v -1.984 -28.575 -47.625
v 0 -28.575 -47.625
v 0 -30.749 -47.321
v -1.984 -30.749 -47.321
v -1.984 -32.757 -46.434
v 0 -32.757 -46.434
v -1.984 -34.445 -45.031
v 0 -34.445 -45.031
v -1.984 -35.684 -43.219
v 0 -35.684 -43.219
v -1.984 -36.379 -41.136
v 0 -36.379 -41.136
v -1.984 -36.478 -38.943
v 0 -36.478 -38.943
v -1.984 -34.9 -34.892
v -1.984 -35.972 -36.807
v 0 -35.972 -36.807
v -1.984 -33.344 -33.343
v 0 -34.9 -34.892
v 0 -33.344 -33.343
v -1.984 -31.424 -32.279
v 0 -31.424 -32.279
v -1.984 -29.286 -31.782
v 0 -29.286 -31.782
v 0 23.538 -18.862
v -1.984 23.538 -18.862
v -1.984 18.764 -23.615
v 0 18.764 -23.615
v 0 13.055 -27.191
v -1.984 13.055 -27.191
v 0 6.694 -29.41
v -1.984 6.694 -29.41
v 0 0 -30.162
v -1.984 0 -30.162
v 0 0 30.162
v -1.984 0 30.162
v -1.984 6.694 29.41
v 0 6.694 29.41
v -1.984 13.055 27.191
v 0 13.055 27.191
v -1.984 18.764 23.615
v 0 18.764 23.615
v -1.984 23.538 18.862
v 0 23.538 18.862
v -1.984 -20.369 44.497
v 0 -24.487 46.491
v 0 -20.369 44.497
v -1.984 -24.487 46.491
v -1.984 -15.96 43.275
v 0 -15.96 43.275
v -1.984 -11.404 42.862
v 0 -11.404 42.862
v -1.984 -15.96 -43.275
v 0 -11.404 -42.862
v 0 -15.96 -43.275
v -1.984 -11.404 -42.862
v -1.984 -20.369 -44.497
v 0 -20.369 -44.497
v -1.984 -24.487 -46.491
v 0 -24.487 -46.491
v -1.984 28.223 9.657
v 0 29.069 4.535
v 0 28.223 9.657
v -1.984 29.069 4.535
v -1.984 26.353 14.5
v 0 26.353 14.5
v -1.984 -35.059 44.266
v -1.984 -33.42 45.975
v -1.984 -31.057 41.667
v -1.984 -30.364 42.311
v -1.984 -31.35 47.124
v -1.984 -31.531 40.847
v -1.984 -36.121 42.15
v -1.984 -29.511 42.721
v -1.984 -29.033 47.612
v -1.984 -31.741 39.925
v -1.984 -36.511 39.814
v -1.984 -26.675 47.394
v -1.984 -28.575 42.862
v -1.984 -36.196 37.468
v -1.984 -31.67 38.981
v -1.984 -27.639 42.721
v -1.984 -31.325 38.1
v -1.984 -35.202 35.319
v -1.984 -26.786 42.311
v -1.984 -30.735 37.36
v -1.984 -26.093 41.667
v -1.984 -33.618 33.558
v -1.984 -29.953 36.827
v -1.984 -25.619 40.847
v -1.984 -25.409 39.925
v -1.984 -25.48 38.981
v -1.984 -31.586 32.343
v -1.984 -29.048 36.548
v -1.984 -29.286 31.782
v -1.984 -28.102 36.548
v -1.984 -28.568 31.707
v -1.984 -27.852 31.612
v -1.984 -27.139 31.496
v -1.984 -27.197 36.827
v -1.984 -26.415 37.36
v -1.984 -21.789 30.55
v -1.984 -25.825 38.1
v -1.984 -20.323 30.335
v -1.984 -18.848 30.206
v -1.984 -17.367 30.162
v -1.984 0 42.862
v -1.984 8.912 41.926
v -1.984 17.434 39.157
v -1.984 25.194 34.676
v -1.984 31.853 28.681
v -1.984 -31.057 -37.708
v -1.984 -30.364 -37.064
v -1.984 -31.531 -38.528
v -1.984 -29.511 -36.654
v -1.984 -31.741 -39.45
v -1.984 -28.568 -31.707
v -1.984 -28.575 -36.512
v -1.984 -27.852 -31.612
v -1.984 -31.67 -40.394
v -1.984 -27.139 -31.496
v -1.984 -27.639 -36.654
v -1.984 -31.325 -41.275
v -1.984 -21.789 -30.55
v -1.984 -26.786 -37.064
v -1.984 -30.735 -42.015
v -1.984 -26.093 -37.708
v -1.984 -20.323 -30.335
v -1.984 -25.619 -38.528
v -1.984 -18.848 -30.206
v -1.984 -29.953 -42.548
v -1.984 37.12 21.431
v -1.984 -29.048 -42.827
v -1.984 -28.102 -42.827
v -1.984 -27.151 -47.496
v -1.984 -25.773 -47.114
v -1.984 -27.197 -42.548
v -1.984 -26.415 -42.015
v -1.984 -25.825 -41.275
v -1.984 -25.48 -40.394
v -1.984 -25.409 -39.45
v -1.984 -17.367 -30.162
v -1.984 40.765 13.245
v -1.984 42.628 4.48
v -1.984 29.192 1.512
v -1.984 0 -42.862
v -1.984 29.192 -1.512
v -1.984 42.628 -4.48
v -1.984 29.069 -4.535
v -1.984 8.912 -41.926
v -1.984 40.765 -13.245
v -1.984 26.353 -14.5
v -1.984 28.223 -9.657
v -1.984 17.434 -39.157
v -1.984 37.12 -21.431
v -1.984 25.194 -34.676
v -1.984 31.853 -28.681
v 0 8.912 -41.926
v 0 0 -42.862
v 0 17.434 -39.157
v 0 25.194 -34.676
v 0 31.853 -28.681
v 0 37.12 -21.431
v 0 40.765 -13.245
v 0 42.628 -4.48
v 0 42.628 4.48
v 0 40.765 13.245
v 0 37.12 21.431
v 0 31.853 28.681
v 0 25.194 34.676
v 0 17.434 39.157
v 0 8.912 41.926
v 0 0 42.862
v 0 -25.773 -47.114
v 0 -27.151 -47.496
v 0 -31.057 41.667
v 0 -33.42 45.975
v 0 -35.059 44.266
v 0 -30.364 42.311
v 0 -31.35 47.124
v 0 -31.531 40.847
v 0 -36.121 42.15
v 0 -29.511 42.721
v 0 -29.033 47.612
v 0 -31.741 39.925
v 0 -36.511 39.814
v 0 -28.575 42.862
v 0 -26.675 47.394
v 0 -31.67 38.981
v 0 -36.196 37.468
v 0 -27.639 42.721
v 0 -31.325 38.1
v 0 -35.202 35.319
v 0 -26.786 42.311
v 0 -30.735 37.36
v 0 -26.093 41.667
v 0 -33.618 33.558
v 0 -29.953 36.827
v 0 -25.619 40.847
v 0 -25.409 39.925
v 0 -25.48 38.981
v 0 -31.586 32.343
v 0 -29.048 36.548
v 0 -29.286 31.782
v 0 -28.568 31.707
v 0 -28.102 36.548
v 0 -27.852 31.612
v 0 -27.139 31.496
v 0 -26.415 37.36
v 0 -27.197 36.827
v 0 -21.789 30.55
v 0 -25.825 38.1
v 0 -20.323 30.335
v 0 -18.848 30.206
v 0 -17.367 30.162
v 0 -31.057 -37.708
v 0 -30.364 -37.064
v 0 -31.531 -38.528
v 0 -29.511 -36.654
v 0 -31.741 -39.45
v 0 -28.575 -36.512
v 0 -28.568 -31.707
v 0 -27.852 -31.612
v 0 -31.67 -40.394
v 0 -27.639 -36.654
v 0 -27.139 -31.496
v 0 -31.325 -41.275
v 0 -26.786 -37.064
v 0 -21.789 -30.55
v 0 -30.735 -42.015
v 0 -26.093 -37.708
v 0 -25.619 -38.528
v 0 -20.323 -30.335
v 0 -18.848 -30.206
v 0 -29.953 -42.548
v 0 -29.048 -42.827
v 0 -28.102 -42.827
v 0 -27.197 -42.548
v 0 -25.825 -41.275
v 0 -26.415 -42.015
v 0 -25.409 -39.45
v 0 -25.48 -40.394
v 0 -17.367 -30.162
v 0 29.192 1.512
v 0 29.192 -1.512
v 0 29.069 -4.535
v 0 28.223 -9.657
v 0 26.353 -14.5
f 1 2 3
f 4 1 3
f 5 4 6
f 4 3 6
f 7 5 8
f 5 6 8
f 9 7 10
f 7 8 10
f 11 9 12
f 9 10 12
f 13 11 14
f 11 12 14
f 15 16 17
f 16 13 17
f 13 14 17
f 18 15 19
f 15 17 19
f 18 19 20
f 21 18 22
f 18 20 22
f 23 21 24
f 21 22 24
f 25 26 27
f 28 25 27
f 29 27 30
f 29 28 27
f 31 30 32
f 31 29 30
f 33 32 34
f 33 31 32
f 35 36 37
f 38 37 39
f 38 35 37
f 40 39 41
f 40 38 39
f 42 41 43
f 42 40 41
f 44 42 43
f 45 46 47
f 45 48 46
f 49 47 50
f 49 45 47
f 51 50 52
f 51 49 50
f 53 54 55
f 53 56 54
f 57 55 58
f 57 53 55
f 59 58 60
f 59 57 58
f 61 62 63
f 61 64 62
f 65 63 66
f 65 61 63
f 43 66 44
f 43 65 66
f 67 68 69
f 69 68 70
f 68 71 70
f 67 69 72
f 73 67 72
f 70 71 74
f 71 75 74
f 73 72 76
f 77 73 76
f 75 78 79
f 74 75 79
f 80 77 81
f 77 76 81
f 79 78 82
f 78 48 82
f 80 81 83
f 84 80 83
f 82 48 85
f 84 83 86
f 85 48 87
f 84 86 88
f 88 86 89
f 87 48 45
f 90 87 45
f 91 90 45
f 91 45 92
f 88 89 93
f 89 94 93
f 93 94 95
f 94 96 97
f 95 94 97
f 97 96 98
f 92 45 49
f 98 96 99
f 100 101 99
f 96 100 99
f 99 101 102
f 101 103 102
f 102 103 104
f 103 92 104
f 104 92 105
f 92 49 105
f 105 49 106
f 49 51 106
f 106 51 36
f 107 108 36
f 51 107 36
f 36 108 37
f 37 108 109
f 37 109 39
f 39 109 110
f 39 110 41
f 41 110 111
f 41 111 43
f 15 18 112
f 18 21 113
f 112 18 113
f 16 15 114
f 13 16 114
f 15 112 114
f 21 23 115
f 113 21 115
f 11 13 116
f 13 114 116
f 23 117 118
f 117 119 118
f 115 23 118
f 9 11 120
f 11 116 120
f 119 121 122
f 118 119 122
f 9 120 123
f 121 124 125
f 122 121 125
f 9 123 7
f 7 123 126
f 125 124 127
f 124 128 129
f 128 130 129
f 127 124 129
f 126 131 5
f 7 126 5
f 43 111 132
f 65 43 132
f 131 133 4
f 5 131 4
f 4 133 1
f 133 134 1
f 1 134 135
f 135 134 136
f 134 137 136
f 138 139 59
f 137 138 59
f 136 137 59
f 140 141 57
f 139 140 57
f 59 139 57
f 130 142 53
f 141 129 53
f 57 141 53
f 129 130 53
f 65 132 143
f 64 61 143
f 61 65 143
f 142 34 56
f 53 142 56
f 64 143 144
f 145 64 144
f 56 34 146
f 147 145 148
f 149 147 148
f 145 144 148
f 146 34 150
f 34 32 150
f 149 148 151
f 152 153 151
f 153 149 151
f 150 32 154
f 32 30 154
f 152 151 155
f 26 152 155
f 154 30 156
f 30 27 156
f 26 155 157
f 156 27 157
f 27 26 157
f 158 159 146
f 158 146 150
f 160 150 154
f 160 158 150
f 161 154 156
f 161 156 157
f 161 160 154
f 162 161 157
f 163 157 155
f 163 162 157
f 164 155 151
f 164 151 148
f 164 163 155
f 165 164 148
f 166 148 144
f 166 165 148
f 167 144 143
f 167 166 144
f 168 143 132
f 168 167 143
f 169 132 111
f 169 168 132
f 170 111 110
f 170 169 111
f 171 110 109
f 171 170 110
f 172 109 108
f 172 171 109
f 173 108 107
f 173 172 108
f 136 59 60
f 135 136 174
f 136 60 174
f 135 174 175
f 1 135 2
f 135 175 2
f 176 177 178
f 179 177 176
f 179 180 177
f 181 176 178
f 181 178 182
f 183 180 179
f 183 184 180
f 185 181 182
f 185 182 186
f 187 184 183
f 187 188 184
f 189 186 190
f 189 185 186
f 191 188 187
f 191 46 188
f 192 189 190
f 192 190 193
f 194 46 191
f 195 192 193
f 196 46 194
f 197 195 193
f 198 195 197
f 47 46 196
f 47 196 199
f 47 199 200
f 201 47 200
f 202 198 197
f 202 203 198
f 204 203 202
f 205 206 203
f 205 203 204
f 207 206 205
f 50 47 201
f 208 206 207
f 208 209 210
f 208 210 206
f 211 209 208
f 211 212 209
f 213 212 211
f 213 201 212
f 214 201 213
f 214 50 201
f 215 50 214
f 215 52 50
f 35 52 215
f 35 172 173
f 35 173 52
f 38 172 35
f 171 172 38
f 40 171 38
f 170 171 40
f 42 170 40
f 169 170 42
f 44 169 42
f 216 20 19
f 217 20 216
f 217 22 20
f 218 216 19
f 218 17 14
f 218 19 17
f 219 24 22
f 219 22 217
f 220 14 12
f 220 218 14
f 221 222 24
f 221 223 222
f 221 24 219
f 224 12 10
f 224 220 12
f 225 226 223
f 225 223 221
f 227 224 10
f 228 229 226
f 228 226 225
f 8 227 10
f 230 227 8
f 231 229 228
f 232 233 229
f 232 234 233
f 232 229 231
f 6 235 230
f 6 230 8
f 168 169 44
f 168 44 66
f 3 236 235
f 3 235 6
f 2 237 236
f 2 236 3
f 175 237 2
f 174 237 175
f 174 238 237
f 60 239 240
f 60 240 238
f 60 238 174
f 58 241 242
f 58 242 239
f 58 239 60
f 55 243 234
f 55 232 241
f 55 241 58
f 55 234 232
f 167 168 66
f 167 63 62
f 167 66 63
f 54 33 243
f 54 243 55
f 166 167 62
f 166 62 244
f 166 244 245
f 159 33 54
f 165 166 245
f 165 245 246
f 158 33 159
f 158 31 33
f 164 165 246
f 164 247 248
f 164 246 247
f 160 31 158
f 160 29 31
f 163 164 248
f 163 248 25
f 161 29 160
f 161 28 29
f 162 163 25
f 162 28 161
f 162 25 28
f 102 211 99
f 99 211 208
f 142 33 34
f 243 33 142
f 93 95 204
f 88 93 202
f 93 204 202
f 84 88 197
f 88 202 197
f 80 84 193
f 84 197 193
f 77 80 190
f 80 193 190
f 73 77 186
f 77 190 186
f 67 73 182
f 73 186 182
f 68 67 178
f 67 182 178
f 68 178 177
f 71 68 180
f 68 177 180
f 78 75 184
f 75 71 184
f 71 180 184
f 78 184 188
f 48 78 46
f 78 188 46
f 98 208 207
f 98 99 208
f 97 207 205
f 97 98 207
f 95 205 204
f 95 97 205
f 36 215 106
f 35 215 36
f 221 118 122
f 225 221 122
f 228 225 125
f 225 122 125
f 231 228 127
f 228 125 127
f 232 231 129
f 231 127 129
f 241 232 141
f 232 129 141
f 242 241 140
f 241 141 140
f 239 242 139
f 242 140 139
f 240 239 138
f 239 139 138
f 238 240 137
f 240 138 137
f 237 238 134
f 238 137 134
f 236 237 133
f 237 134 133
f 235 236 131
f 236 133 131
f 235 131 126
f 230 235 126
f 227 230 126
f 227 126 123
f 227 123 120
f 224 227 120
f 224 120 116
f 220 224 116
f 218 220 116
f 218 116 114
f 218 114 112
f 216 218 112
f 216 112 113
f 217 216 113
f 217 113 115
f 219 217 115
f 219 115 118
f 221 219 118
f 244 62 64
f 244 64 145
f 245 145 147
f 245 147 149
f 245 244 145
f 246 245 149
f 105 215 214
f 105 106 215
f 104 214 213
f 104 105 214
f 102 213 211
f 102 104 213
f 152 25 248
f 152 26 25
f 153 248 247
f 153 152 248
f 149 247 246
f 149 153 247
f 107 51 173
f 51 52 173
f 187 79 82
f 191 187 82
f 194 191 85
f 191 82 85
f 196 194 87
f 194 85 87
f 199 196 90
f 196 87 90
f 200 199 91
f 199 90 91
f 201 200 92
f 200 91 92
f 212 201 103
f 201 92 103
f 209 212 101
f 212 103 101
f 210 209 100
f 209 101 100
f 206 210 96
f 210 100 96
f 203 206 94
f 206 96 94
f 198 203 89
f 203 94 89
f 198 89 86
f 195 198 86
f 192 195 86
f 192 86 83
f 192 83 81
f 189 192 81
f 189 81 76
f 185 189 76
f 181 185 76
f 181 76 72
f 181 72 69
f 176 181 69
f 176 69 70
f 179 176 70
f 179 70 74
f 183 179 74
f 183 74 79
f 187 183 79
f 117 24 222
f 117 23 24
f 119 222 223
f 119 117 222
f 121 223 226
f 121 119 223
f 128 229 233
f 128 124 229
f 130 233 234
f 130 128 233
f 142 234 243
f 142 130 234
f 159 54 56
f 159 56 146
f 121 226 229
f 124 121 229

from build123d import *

# Parameters (mm, degrees)
BASE_FLANGE1_DEPTH          = 1.984375
F_1_4_0_25_DIAMETER_HOLE1_D = 6.35
BOSS_EXTRUDE1_DEPTH         = 1.984375
FILLET1_R                   = 25.4
CUT_EXTRUDE1_DEPTH          = 66.291667351
FILLET2_R                   = 25.4


# Sheet-metal steps are written as plain solids
with BuildPart() as part:
    # Sketch2 → Base-Flange1 (new body)
    with BuildSketch(Plane(origin=(0, 0, 0), x_dir=(0, 0, -1), z_dir=(1, 0, 0))):
        with BuildLine():
            Line((30.1625, 0), (30.1625, -28.575))
            ThreePointArc((30.1625, -28.575), (45.186761314, -36.352129933), (42.8625, -19.594743879))
            Line((42.8625, -19.594743879), (42.8625, 0))
            ThreePointArc((42.8625, 0), (0, 42.8625), (-42.8625, 0))
            Line((-42.8625, 0), (-42.8625, -19.594743879))
            ThreePointArc((-42.8625, -19.594743879), (-45.186761314, -36.352129933), (-30.1625, -28.575))
            Line((-30.1625, -28.575), (-30.1625, 0))
            ThreePointArc((-30.1625, 0), (0, 30.1625), (30.1625, 0))
        make_face()
    extrude(amount=-BASE_FLANGE1_DEPTH)

    # 1/4 (0.25) Diameter Hole1 (through all)
    with Locations(Plane(origin=(0, 0, 0), x_dir=(0, 0, -1), z_dir=(1, 0, 0))):
        with Locations((-39.6875, -28.575), (39.6875, -28.575)):
            Hole(F_1_4_0_25_DIAMETER_HOLE1_D / 2)

    # Sketch10 → Boss-Extrude1 (add)
    with BuildSketch(Plane(origin=(0, 0, 0), x_dir=(0, 0, -1), z_dir=(1, 0, 0))):
        with BuildLine():
            ThreePointArc((9.656385517, 28.575), (0, 30.1625), (-9.656385517, 28.575))
            ThreePointArc((-9.656385517, 28.575), (0, 29.207811784), (9.656385517, 28.575))
        make_face()
    extrude(amount=-BOSS_EXTRUDE1_DEPTH)

    # Fillet1
    fillet1_edges = [part.edges().sort_by_distance(p)[0] for p in [
        (-0.9921875, 28.575, 9.656385517),
        (-0.9921875, 28.575, -9.656385517),
    ]]
    fillet(fillet1_edges, radius=FILLET1_R)

    # Sketch11 → Cut-Extrude1 (cut, through all)
    with BuildSketch(Plane(origin=(0, 0, 0), x_dir=(0, 0, -1), z_dir=(1, 0, 0))):
        with BuildLine():
            Line((-42.8625, -21.300161084), (-42.8625, -19.594743879))
            ThreePointArc((-42.8625, -19.594743879), (-45.186761314, -36.352129933), (-30.1625, -28.575))
            Line((-30.1625, -28.575), (-30.1625, -19.594743879))
            Line((-30.1625, -19.594743879), (-31.75, -28.575))
            ThreePointArc((-31.75, -28.575), (-44.0350478, -35.215988961), (-42.8625, -21.300161084))
        make_face()
        with BuildLine():
            ThreePointArc((30.1625, -28.575), (45.186761314, -36.352129933), (42.8625, -19.594743879))
            Line((42.8625, -19.594743879), (42.8625, -21.300161084))
            ThreePointArc((42.8625, -21.300161084), (46.328488961, -24.2274522), (47.625, -28.575))
            ThreePointArc((47.625, -28.575), (39.6875, -36.5125), (31.75, -28.575))
            Line((31.75, -28.575), (30.1625, -19.594743879))
            Line((30.1625, -19.594743879), (30.1625, -28.575))
        make_face()
    extrude(amount=-CUT_EXTRUDE1_DEPTH, mode=Mode.SUBTRACT)

    # Fillet2
    fillet2_edges = [part.edges().sort_by_distance(p)[0] for p in [
        (-0.9921875, -21.300161084, 42.8625),
        (-0.9921875, -28.575, 31.75),
        (-0.9921875, -19.594743879, 30.1625),
        (-0.9921875, -28.575, -31.75),
        (-0.9921875, -21.300161084, -42.8625),
        (-0.9921875, -19.594743879, -30.1625),
    ]]
    fillet(fillet2_edges, radius=FILLET2_R)


solid = part.part
